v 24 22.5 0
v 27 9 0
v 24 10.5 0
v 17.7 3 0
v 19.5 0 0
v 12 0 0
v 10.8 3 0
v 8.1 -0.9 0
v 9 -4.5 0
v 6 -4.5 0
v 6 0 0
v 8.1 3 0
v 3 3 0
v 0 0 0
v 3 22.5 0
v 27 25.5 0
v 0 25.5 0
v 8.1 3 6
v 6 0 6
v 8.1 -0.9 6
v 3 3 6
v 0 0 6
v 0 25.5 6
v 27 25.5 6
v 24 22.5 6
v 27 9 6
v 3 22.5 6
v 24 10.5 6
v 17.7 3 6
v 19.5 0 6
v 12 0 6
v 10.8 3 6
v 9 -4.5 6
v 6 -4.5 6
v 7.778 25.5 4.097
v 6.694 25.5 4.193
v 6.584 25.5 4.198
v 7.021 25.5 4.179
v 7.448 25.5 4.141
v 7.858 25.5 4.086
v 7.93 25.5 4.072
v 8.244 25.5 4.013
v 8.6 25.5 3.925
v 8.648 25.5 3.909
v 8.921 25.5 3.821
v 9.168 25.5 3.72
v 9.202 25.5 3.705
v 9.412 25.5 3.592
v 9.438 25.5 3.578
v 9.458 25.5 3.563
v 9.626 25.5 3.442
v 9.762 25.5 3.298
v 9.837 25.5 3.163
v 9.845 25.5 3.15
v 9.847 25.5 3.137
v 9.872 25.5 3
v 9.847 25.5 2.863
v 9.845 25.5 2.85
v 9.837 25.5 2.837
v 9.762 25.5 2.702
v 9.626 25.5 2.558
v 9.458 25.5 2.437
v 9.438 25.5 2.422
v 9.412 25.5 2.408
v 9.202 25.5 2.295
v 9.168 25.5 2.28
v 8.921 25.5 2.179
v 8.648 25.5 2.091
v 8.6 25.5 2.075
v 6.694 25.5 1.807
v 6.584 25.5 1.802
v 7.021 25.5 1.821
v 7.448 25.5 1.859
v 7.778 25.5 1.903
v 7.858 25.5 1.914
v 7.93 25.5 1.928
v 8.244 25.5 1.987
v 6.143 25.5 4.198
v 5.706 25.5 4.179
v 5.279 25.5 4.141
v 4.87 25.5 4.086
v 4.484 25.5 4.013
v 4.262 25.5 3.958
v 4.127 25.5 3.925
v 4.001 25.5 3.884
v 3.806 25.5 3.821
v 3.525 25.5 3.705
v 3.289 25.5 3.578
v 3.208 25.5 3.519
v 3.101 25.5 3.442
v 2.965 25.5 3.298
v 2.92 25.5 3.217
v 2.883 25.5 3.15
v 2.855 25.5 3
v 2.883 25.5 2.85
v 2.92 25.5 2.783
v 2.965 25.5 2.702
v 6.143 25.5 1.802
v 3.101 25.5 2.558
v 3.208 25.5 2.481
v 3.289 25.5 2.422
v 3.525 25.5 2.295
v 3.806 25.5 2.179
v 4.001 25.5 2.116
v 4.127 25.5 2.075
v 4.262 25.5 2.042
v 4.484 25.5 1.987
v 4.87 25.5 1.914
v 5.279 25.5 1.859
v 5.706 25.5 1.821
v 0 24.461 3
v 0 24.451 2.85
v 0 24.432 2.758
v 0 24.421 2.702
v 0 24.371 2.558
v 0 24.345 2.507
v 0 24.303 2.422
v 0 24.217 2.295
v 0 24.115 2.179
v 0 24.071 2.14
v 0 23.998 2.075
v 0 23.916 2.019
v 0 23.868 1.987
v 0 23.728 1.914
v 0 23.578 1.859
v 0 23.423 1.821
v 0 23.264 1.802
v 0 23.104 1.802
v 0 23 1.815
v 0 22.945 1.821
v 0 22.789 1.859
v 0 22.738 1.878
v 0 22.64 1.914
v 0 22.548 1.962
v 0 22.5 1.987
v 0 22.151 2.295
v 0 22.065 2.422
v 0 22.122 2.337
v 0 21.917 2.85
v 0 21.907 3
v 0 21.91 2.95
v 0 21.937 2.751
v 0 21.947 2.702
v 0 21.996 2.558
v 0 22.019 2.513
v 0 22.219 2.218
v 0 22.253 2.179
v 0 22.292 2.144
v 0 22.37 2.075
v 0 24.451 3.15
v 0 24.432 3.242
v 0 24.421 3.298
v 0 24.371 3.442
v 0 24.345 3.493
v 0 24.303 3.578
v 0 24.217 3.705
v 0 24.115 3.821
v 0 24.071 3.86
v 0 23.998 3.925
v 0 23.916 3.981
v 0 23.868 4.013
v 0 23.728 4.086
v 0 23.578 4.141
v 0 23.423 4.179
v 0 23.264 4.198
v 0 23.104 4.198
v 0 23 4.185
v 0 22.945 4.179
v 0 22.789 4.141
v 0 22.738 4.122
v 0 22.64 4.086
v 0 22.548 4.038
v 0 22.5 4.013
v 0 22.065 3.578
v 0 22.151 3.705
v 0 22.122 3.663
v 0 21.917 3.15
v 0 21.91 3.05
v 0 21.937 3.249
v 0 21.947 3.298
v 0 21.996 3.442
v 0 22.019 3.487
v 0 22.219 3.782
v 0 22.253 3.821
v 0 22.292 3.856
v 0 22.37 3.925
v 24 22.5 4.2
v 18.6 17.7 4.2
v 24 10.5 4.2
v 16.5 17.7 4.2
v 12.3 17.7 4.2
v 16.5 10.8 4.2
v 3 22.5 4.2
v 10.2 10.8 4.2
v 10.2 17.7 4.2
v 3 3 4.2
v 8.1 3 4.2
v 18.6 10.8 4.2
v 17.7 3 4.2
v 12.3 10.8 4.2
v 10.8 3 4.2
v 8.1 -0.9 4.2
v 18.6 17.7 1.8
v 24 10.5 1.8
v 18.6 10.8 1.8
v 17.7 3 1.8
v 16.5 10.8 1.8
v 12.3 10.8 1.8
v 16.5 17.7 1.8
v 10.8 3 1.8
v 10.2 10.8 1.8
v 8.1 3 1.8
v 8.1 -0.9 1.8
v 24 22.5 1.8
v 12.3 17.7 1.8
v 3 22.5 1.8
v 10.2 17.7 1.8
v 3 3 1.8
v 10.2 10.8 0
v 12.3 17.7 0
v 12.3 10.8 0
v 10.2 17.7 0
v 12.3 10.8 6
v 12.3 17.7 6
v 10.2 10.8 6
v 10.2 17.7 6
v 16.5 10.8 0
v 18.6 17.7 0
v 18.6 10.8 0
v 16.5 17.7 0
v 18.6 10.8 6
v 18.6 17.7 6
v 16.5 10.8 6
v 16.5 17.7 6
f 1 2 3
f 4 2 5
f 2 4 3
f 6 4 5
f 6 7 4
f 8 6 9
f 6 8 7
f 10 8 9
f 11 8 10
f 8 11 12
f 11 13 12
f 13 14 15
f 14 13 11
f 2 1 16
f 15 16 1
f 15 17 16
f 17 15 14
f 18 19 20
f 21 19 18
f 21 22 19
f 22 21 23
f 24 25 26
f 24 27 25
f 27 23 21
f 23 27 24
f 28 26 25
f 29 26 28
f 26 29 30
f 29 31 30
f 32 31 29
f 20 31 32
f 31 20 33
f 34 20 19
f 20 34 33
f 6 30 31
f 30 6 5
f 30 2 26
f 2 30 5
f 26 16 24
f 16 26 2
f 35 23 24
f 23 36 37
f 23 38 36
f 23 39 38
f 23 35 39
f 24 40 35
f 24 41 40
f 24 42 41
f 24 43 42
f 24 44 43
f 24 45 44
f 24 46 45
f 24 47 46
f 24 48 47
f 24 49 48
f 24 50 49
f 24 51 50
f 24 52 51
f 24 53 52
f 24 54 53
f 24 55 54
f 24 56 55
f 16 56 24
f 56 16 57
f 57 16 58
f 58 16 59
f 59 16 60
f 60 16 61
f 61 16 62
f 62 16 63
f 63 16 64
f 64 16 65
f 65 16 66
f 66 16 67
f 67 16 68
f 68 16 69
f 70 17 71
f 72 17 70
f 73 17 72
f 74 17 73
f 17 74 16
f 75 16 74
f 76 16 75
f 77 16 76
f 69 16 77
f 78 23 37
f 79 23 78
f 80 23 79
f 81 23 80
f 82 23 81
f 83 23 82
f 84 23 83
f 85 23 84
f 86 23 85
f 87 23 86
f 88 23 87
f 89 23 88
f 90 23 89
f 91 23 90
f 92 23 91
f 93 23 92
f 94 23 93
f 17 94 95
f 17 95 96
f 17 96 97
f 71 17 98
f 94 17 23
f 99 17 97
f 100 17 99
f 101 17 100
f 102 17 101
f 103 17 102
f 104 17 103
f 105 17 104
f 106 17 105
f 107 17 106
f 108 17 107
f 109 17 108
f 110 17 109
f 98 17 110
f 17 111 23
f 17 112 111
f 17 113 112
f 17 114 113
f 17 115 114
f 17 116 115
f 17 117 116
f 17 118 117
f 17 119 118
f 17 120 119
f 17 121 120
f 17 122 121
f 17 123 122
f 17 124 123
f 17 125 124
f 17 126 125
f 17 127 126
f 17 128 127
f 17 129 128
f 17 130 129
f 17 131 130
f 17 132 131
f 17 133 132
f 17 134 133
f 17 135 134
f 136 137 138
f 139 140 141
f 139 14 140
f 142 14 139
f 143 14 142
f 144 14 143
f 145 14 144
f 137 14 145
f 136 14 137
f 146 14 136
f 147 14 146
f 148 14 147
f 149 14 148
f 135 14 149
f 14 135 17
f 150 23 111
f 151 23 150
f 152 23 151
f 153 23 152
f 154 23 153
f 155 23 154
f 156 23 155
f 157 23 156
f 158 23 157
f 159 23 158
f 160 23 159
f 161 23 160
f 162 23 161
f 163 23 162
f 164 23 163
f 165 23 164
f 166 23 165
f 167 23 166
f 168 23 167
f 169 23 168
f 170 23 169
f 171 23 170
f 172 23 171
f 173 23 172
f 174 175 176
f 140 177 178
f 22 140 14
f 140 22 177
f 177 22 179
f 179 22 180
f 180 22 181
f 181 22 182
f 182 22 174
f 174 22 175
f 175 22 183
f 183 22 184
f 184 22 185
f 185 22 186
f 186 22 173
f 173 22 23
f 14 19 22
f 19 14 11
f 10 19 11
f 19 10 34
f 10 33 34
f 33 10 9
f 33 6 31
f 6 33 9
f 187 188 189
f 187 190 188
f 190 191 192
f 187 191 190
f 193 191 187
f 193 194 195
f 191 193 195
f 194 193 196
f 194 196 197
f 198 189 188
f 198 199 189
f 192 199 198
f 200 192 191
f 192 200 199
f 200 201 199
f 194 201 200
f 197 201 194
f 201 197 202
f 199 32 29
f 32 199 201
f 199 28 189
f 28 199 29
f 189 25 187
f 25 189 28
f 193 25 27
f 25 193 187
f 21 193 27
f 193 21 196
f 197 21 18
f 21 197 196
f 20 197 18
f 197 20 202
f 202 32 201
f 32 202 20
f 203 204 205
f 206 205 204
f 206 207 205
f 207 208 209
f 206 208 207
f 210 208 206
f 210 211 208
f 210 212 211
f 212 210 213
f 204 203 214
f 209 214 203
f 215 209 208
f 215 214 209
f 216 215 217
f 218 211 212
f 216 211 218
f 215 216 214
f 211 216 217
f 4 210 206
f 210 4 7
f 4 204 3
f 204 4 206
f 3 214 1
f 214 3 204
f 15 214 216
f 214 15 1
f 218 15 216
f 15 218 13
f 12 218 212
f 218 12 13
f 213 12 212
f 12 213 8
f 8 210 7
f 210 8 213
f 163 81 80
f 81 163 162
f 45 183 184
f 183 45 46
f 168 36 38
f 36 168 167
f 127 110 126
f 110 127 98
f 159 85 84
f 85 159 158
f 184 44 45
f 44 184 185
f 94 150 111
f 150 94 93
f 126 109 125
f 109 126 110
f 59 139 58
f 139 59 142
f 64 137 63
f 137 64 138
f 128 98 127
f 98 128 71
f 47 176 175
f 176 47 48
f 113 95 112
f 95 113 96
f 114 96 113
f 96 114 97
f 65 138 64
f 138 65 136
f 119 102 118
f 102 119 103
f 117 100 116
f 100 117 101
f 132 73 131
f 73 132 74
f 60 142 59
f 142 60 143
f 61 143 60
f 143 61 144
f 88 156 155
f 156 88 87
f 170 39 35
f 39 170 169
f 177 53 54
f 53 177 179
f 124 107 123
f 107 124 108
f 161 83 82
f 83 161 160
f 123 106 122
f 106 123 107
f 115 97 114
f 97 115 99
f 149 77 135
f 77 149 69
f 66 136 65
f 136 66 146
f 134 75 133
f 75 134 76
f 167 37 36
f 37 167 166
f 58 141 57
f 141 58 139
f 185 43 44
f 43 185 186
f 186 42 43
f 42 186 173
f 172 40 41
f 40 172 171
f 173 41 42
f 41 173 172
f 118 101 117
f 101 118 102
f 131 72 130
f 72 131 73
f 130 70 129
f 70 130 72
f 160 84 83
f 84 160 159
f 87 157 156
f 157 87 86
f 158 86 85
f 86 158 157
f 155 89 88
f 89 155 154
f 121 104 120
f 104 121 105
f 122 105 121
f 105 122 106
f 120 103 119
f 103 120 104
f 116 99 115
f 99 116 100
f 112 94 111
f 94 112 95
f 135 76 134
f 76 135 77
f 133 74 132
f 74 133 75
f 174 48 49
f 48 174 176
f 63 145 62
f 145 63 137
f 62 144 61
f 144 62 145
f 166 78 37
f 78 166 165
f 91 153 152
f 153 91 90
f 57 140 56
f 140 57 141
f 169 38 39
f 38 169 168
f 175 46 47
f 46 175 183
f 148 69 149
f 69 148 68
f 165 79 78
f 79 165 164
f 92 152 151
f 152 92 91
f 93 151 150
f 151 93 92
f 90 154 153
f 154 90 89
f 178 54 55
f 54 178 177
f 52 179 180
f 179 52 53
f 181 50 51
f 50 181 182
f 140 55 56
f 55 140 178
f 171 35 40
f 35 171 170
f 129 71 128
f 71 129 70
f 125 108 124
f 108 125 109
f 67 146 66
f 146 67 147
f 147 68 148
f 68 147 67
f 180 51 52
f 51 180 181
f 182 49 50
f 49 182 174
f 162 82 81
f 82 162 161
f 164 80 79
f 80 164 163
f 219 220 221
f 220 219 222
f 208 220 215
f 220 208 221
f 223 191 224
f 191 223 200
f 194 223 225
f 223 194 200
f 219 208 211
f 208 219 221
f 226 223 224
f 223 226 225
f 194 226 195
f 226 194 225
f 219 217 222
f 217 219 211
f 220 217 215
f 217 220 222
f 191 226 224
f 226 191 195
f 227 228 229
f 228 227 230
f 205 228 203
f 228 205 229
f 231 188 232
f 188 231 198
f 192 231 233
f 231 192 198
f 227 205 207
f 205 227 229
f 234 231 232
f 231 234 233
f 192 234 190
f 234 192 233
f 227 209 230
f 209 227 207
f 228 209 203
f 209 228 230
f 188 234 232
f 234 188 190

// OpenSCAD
//Liza Salvi
//Twitch logo necklace
//If you could make it in purple that'd be awesome
//I also want it to be about an inch wide
module twitch(size){
scale([size,size,size]){
$fn=50;
union(){
difference(){
    linear_extrude(height=2){
        polygon([[0,8.5],[9,8.5],[9,3],[6.5,0],[4,0],[3,-1.5],[2,-1.5],[2,0],[0,0]]);
    }
    translate([0,0,1.4]){
        linear_extrude(height=2){
            polygon([[1,7.5],[8,7.5],[8,3.5],[5.9,1],[3.6,1],[2.7,-.3],[2.7,1],[1,1]]);
        }
    }
    translate([0,0,-1.4]){
        linear_extrude(height=2){
            polygon([[1,7.5],[8,7.5],[8,3.5],[5.9,1],[3.6,1],[2.7,-.3],[2.7,1],[1,1]]);
        }
    }
    translate([-2,7,1]){
        rotate([90,0,110]){
            cylinder(d=0.8,h=6);
        }
    }
}
linear_extrude(height=2){
        polygon([[3.4,5.9],[4.1,5.9],[4.1,3.6],[3.4,3.6]]);
    }
linear_extrude(height=2){
        polygon([[5.5,5.9],[6.2,5.9],[6.2,3.6],[5.5,3.6]]);
    }
}
}
}
twitch(3);
